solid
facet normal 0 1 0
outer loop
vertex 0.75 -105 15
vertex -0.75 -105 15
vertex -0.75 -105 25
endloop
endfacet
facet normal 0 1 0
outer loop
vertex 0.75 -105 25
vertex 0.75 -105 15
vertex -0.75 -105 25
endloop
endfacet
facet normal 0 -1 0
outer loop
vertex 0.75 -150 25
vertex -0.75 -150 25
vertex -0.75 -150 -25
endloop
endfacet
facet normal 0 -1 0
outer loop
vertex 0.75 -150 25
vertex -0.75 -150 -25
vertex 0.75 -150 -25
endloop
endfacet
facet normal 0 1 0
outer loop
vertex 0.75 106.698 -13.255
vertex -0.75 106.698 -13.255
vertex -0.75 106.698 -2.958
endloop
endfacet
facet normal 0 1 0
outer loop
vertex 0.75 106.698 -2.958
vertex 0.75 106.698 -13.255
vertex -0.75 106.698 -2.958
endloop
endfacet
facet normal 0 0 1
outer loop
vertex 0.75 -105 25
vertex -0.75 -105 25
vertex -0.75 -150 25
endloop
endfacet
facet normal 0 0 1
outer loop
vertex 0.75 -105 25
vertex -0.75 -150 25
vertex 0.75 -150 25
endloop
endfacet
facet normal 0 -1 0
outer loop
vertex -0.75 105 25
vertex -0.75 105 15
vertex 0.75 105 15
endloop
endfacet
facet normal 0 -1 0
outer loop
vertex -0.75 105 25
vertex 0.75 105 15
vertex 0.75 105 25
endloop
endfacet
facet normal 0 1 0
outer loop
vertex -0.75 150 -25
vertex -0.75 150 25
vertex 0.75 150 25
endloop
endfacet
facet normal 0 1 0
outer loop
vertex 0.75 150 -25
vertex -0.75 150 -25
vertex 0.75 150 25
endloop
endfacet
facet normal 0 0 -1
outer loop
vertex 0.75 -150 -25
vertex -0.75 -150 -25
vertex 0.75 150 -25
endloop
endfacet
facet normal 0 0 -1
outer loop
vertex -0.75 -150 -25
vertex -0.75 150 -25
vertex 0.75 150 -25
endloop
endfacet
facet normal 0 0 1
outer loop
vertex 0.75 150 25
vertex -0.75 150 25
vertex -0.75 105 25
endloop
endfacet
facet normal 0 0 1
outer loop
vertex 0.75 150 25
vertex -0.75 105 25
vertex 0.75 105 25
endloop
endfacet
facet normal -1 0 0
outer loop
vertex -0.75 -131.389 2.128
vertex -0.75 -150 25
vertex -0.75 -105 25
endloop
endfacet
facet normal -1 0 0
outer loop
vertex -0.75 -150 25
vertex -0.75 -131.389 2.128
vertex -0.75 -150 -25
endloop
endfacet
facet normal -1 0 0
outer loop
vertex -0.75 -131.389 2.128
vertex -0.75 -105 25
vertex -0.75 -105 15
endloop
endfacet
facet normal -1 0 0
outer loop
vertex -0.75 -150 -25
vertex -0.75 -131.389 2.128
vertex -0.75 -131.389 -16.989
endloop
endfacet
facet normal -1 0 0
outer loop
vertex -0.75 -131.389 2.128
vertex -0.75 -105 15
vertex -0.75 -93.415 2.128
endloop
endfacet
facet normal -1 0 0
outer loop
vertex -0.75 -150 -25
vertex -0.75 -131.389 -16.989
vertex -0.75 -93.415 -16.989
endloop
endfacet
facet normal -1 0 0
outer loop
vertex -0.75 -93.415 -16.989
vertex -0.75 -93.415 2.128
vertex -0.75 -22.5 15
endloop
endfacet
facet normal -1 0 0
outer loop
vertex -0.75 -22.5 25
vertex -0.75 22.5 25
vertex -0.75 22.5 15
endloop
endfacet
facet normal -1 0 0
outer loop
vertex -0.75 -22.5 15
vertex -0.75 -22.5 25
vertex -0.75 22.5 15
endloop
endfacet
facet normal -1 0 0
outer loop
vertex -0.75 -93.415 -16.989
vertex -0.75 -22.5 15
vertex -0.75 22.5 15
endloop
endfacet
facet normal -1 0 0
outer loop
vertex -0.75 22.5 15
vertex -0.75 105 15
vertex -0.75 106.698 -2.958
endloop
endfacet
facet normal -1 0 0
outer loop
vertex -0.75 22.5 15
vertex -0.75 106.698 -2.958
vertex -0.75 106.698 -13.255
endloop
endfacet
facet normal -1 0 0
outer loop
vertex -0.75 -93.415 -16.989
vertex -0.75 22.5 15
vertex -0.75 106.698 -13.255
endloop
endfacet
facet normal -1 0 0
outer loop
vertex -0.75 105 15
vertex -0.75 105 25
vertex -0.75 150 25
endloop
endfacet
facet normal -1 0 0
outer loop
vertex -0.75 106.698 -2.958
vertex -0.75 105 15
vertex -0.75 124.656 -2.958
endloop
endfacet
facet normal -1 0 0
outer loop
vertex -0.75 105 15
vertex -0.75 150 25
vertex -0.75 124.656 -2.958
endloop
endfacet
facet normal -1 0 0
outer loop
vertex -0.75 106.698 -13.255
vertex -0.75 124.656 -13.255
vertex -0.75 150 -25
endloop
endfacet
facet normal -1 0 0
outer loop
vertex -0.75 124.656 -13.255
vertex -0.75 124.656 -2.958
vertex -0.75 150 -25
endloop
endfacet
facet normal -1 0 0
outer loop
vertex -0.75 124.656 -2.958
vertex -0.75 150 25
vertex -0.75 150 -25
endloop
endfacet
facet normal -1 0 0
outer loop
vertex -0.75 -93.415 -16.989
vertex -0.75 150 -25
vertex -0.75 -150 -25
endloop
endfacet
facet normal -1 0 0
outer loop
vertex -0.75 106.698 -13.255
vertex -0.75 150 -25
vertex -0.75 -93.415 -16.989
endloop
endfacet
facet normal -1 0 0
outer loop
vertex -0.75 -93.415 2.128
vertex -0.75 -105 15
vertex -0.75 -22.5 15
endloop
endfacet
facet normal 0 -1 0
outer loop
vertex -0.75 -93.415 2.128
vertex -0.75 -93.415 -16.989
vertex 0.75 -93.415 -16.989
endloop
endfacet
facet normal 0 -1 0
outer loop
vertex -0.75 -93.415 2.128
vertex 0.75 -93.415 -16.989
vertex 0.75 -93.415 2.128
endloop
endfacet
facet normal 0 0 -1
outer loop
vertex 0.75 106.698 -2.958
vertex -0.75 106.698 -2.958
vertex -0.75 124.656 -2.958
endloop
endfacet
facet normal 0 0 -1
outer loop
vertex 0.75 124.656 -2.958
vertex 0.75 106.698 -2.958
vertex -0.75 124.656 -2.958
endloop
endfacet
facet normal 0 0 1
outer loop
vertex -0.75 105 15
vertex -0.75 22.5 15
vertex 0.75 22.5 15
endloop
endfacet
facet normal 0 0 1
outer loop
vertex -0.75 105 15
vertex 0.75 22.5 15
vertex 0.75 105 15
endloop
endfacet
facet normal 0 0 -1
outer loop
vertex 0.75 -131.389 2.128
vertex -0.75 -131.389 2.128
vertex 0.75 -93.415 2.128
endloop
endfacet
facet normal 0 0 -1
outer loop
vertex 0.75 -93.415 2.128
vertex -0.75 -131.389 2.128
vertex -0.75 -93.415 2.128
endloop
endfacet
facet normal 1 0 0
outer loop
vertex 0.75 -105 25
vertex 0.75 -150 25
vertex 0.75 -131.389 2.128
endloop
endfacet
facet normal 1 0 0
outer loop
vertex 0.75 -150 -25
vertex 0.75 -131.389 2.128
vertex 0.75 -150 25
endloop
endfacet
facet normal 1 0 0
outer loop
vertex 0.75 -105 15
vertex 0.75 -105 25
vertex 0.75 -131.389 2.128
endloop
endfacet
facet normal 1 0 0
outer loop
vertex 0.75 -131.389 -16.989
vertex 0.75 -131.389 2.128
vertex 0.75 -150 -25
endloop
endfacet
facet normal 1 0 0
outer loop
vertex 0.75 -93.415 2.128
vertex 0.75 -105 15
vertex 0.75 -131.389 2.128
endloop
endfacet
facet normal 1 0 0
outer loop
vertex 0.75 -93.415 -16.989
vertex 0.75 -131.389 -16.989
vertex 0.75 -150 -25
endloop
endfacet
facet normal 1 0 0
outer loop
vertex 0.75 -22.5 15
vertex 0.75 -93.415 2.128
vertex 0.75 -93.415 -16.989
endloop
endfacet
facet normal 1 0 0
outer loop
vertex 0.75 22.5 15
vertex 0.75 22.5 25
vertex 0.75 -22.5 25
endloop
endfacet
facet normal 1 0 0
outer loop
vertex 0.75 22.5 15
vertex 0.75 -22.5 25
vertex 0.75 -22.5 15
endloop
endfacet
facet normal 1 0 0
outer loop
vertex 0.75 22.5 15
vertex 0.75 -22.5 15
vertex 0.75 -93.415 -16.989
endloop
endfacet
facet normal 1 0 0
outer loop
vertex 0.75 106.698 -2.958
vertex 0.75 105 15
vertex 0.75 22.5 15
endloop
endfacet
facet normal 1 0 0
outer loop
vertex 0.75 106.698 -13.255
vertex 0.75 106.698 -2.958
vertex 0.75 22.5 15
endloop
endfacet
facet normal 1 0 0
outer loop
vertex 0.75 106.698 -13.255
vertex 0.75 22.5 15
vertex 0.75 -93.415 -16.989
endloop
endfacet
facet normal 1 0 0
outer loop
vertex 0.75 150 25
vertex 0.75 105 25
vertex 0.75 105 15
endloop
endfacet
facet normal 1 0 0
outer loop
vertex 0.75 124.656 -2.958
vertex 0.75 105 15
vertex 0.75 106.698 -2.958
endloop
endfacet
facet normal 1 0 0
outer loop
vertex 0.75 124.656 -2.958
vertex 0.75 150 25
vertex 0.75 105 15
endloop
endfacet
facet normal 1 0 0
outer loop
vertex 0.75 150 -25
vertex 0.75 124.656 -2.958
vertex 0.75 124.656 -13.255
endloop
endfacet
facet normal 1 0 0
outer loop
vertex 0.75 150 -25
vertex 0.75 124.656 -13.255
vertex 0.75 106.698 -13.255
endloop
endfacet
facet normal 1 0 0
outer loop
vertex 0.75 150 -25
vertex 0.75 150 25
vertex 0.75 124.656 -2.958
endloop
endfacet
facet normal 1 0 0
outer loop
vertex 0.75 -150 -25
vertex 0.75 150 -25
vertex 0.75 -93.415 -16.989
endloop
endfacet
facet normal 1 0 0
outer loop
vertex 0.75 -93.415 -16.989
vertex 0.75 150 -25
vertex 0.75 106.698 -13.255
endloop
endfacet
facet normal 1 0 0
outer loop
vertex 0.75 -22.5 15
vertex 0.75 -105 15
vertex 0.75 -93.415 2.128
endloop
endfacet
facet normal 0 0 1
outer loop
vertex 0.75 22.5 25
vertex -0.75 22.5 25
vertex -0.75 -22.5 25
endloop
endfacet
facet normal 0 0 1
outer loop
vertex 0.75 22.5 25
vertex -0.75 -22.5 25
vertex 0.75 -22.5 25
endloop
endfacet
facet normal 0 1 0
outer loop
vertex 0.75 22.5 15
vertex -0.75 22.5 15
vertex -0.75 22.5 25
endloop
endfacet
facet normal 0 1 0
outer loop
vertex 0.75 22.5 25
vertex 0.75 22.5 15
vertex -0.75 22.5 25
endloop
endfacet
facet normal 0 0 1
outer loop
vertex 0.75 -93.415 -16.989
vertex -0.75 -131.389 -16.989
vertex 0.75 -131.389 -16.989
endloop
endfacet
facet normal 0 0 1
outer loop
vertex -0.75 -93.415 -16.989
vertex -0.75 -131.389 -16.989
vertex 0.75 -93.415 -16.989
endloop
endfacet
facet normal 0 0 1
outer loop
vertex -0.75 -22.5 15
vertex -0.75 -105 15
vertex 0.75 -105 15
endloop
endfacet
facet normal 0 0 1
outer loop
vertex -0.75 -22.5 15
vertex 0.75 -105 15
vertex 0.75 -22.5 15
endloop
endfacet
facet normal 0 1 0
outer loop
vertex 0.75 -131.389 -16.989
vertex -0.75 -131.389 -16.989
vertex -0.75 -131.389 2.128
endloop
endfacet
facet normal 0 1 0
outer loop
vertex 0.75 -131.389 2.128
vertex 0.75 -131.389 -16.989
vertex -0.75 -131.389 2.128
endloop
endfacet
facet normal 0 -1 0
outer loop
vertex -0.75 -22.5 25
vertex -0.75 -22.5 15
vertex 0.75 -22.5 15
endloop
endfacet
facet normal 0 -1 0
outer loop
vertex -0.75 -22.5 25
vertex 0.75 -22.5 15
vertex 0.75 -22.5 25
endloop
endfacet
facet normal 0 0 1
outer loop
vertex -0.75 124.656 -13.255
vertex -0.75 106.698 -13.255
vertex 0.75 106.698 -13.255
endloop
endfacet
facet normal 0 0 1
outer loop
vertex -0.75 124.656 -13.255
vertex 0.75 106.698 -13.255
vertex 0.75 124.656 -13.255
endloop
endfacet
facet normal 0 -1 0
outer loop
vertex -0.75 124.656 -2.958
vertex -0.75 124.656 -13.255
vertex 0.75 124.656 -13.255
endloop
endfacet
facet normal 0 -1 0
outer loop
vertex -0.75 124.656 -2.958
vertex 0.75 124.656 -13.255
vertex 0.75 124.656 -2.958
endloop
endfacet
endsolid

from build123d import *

# Parameters (mm, degrees)
SKETCH1_W           = 1.5
SKETCH1_H           = 50
BOSS_EXTRUDE1_DEPTH = 150
SKETCH2_W           = 10
SKETCH2_H           = 82.5
CUT_EXTRUDE1_DEPTH  = 2.5
SKETCH3_W           = 19.117585256
SKETCH3_H           = 37.973569139
POWERCONN_DEPTH     = 2.5
SKETCH4_W           = 10.297175775
SKETCH4_H           = 17.958343038
USBCONN_DEPTH       = 2.5


with BuildPart() as part:
    # Sketch1 → Boss-Extrude1 (new body, symmetric)
    with BuildSketch(Plane(origin=(0, 0, 0), x_dir=(1, 0, 0), z_dir=(0, 1, 0))):
        Rectangle(SKETCH1_W, SKETCH1_H)
    extrude(amount=BOSS_EXTRUDE1_DEPTH, both=True)

    # Sketch2 → Cut-Extrude1 (cut, through all)
    with BuildSketch(Plane.ZY.offset(0.75)):
        with Locations((20, 63.75)):
            Rectangle(SKETCH2_W, SKETCH2_H)
        with Locations((20, -63.75)):
            Rectangle(SKETCH2_W, SKETCH2_H)
    extrude(amount=-CUT_EXTRUDE1_DEPTH, mode=Mode.SUBTRACT)

    # Sketch3 → PowerConn (cut, through all)
    with BuildSketch(Plane.ZY.offset(0.75)):
        with Locations((-7.430305419, -112.401736371)):
            Rectangle(SKETCH3_W, SKETCH3_H)
    extrude(amount=-POWERCONN_DEPTH, mode=Mode.SUBTRACT)

    # Sketch4 → UsbConn (cut, through all)
    with BuildSketch(Plane.ZY.offset(0.75)):
        with Locations((-8.106092581, 115.676720654)):
            Rectangle(SKETCH4_W, SKETCH4_H)
    extrude(amount=-USBCONN_DEPTH, mode=Mode.SUBTRACT)


solid = part.part
